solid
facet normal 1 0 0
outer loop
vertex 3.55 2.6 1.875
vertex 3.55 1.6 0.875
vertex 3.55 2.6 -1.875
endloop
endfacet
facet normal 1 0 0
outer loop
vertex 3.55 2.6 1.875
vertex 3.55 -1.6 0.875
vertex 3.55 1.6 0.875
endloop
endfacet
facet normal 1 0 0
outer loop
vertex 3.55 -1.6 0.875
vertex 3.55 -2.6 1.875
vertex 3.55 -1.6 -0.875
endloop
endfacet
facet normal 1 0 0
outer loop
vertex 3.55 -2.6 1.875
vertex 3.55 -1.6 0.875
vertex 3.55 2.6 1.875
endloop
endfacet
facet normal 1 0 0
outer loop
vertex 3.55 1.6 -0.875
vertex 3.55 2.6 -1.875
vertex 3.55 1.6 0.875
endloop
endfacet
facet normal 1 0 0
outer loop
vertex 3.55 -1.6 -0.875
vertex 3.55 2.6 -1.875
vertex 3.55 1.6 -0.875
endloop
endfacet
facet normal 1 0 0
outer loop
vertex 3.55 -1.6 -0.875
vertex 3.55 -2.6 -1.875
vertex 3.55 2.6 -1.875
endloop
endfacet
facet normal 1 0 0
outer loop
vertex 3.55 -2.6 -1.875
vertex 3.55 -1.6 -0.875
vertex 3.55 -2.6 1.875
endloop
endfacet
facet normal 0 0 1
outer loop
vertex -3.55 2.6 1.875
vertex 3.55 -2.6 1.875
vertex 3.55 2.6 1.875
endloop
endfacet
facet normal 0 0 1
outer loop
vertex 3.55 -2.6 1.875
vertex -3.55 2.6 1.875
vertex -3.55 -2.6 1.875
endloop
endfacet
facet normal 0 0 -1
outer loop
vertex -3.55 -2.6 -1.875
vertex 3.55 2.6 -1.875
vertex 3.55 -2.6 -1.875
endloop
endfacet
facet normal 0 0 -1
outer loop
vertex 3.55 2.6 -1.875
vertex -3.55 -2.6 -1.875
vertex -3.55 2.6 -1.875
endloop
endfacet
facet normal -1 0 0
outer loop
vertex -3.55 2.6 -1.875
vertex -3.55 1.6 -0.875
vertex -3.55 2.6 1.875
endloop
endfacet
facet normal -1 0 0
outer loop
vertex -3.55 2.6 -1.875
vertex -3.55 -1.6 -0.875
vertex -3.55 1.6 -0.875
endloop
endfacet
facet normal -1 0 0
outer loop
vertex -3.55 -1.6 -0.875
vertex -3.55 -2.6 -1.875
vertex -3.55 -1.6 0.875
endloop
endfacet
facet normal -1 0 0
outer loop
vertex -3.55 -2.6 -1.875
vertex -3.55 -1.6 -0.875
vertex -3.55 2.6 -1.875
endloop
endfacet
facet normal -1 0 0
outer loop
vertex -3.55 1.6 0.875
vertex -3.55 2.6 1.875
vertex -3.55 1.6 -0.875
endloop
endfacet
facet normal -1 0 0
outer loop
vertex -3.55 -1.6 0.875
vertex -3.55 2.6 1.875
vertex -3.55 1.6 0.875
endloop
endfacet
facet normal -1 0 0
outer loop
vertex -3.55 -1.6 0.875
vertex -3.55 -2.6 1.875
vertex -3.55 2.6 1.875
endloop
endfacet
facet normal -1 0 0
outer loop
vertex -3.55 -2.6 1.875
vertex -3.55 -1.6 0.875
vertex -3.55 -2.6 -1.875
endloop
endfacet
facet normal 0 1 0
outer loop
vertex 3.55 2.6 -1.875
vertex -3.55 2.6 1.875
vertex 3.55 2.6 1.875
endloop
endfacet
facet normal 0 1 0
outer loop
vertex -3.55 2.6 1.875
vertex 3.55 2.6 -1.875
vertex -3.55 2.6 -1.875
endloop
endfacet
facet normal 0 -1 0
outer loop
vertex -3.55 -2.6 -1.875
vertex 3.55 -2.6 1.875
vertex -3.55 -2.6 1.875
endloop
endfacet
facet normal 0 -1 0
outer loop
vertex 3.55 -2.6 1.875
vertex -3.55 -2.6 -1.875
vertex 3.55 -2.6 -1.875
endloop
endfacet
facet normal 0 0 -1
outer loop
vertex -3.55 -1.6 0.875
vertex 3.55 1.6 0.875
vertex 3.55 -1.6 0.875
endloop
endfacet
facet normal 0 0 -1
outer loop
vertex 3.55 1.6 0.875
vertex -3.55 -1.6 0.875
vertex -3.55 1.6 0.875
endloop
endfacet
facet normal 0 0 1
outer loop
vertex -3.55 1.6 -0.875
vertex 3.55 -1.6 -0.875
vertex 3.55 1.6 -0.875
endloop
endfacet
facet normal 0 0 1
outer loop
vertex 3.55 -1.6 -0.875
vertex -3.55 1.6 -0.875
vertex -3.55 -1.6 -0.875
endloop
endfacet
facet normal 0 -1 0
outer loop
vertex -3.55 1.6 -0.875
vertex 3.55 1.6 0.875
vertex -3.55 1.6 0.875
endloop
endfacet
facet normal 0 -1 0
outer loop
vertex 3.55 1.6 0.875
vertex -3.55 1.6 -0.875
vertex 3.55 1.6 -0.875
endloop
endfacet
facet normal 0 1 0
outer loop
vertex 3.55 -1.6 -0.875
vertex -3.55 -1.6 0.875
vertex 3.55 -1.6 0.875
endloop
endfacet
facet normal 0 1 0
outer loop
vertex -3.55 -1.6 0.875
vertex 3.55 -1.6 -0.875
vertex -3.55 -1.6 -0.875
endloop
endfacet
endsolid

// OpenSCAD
difference() {
    cube([7.1,3.2+2,1.75+2], true);
    cube([7.1,3.2,1.75], true);
}
